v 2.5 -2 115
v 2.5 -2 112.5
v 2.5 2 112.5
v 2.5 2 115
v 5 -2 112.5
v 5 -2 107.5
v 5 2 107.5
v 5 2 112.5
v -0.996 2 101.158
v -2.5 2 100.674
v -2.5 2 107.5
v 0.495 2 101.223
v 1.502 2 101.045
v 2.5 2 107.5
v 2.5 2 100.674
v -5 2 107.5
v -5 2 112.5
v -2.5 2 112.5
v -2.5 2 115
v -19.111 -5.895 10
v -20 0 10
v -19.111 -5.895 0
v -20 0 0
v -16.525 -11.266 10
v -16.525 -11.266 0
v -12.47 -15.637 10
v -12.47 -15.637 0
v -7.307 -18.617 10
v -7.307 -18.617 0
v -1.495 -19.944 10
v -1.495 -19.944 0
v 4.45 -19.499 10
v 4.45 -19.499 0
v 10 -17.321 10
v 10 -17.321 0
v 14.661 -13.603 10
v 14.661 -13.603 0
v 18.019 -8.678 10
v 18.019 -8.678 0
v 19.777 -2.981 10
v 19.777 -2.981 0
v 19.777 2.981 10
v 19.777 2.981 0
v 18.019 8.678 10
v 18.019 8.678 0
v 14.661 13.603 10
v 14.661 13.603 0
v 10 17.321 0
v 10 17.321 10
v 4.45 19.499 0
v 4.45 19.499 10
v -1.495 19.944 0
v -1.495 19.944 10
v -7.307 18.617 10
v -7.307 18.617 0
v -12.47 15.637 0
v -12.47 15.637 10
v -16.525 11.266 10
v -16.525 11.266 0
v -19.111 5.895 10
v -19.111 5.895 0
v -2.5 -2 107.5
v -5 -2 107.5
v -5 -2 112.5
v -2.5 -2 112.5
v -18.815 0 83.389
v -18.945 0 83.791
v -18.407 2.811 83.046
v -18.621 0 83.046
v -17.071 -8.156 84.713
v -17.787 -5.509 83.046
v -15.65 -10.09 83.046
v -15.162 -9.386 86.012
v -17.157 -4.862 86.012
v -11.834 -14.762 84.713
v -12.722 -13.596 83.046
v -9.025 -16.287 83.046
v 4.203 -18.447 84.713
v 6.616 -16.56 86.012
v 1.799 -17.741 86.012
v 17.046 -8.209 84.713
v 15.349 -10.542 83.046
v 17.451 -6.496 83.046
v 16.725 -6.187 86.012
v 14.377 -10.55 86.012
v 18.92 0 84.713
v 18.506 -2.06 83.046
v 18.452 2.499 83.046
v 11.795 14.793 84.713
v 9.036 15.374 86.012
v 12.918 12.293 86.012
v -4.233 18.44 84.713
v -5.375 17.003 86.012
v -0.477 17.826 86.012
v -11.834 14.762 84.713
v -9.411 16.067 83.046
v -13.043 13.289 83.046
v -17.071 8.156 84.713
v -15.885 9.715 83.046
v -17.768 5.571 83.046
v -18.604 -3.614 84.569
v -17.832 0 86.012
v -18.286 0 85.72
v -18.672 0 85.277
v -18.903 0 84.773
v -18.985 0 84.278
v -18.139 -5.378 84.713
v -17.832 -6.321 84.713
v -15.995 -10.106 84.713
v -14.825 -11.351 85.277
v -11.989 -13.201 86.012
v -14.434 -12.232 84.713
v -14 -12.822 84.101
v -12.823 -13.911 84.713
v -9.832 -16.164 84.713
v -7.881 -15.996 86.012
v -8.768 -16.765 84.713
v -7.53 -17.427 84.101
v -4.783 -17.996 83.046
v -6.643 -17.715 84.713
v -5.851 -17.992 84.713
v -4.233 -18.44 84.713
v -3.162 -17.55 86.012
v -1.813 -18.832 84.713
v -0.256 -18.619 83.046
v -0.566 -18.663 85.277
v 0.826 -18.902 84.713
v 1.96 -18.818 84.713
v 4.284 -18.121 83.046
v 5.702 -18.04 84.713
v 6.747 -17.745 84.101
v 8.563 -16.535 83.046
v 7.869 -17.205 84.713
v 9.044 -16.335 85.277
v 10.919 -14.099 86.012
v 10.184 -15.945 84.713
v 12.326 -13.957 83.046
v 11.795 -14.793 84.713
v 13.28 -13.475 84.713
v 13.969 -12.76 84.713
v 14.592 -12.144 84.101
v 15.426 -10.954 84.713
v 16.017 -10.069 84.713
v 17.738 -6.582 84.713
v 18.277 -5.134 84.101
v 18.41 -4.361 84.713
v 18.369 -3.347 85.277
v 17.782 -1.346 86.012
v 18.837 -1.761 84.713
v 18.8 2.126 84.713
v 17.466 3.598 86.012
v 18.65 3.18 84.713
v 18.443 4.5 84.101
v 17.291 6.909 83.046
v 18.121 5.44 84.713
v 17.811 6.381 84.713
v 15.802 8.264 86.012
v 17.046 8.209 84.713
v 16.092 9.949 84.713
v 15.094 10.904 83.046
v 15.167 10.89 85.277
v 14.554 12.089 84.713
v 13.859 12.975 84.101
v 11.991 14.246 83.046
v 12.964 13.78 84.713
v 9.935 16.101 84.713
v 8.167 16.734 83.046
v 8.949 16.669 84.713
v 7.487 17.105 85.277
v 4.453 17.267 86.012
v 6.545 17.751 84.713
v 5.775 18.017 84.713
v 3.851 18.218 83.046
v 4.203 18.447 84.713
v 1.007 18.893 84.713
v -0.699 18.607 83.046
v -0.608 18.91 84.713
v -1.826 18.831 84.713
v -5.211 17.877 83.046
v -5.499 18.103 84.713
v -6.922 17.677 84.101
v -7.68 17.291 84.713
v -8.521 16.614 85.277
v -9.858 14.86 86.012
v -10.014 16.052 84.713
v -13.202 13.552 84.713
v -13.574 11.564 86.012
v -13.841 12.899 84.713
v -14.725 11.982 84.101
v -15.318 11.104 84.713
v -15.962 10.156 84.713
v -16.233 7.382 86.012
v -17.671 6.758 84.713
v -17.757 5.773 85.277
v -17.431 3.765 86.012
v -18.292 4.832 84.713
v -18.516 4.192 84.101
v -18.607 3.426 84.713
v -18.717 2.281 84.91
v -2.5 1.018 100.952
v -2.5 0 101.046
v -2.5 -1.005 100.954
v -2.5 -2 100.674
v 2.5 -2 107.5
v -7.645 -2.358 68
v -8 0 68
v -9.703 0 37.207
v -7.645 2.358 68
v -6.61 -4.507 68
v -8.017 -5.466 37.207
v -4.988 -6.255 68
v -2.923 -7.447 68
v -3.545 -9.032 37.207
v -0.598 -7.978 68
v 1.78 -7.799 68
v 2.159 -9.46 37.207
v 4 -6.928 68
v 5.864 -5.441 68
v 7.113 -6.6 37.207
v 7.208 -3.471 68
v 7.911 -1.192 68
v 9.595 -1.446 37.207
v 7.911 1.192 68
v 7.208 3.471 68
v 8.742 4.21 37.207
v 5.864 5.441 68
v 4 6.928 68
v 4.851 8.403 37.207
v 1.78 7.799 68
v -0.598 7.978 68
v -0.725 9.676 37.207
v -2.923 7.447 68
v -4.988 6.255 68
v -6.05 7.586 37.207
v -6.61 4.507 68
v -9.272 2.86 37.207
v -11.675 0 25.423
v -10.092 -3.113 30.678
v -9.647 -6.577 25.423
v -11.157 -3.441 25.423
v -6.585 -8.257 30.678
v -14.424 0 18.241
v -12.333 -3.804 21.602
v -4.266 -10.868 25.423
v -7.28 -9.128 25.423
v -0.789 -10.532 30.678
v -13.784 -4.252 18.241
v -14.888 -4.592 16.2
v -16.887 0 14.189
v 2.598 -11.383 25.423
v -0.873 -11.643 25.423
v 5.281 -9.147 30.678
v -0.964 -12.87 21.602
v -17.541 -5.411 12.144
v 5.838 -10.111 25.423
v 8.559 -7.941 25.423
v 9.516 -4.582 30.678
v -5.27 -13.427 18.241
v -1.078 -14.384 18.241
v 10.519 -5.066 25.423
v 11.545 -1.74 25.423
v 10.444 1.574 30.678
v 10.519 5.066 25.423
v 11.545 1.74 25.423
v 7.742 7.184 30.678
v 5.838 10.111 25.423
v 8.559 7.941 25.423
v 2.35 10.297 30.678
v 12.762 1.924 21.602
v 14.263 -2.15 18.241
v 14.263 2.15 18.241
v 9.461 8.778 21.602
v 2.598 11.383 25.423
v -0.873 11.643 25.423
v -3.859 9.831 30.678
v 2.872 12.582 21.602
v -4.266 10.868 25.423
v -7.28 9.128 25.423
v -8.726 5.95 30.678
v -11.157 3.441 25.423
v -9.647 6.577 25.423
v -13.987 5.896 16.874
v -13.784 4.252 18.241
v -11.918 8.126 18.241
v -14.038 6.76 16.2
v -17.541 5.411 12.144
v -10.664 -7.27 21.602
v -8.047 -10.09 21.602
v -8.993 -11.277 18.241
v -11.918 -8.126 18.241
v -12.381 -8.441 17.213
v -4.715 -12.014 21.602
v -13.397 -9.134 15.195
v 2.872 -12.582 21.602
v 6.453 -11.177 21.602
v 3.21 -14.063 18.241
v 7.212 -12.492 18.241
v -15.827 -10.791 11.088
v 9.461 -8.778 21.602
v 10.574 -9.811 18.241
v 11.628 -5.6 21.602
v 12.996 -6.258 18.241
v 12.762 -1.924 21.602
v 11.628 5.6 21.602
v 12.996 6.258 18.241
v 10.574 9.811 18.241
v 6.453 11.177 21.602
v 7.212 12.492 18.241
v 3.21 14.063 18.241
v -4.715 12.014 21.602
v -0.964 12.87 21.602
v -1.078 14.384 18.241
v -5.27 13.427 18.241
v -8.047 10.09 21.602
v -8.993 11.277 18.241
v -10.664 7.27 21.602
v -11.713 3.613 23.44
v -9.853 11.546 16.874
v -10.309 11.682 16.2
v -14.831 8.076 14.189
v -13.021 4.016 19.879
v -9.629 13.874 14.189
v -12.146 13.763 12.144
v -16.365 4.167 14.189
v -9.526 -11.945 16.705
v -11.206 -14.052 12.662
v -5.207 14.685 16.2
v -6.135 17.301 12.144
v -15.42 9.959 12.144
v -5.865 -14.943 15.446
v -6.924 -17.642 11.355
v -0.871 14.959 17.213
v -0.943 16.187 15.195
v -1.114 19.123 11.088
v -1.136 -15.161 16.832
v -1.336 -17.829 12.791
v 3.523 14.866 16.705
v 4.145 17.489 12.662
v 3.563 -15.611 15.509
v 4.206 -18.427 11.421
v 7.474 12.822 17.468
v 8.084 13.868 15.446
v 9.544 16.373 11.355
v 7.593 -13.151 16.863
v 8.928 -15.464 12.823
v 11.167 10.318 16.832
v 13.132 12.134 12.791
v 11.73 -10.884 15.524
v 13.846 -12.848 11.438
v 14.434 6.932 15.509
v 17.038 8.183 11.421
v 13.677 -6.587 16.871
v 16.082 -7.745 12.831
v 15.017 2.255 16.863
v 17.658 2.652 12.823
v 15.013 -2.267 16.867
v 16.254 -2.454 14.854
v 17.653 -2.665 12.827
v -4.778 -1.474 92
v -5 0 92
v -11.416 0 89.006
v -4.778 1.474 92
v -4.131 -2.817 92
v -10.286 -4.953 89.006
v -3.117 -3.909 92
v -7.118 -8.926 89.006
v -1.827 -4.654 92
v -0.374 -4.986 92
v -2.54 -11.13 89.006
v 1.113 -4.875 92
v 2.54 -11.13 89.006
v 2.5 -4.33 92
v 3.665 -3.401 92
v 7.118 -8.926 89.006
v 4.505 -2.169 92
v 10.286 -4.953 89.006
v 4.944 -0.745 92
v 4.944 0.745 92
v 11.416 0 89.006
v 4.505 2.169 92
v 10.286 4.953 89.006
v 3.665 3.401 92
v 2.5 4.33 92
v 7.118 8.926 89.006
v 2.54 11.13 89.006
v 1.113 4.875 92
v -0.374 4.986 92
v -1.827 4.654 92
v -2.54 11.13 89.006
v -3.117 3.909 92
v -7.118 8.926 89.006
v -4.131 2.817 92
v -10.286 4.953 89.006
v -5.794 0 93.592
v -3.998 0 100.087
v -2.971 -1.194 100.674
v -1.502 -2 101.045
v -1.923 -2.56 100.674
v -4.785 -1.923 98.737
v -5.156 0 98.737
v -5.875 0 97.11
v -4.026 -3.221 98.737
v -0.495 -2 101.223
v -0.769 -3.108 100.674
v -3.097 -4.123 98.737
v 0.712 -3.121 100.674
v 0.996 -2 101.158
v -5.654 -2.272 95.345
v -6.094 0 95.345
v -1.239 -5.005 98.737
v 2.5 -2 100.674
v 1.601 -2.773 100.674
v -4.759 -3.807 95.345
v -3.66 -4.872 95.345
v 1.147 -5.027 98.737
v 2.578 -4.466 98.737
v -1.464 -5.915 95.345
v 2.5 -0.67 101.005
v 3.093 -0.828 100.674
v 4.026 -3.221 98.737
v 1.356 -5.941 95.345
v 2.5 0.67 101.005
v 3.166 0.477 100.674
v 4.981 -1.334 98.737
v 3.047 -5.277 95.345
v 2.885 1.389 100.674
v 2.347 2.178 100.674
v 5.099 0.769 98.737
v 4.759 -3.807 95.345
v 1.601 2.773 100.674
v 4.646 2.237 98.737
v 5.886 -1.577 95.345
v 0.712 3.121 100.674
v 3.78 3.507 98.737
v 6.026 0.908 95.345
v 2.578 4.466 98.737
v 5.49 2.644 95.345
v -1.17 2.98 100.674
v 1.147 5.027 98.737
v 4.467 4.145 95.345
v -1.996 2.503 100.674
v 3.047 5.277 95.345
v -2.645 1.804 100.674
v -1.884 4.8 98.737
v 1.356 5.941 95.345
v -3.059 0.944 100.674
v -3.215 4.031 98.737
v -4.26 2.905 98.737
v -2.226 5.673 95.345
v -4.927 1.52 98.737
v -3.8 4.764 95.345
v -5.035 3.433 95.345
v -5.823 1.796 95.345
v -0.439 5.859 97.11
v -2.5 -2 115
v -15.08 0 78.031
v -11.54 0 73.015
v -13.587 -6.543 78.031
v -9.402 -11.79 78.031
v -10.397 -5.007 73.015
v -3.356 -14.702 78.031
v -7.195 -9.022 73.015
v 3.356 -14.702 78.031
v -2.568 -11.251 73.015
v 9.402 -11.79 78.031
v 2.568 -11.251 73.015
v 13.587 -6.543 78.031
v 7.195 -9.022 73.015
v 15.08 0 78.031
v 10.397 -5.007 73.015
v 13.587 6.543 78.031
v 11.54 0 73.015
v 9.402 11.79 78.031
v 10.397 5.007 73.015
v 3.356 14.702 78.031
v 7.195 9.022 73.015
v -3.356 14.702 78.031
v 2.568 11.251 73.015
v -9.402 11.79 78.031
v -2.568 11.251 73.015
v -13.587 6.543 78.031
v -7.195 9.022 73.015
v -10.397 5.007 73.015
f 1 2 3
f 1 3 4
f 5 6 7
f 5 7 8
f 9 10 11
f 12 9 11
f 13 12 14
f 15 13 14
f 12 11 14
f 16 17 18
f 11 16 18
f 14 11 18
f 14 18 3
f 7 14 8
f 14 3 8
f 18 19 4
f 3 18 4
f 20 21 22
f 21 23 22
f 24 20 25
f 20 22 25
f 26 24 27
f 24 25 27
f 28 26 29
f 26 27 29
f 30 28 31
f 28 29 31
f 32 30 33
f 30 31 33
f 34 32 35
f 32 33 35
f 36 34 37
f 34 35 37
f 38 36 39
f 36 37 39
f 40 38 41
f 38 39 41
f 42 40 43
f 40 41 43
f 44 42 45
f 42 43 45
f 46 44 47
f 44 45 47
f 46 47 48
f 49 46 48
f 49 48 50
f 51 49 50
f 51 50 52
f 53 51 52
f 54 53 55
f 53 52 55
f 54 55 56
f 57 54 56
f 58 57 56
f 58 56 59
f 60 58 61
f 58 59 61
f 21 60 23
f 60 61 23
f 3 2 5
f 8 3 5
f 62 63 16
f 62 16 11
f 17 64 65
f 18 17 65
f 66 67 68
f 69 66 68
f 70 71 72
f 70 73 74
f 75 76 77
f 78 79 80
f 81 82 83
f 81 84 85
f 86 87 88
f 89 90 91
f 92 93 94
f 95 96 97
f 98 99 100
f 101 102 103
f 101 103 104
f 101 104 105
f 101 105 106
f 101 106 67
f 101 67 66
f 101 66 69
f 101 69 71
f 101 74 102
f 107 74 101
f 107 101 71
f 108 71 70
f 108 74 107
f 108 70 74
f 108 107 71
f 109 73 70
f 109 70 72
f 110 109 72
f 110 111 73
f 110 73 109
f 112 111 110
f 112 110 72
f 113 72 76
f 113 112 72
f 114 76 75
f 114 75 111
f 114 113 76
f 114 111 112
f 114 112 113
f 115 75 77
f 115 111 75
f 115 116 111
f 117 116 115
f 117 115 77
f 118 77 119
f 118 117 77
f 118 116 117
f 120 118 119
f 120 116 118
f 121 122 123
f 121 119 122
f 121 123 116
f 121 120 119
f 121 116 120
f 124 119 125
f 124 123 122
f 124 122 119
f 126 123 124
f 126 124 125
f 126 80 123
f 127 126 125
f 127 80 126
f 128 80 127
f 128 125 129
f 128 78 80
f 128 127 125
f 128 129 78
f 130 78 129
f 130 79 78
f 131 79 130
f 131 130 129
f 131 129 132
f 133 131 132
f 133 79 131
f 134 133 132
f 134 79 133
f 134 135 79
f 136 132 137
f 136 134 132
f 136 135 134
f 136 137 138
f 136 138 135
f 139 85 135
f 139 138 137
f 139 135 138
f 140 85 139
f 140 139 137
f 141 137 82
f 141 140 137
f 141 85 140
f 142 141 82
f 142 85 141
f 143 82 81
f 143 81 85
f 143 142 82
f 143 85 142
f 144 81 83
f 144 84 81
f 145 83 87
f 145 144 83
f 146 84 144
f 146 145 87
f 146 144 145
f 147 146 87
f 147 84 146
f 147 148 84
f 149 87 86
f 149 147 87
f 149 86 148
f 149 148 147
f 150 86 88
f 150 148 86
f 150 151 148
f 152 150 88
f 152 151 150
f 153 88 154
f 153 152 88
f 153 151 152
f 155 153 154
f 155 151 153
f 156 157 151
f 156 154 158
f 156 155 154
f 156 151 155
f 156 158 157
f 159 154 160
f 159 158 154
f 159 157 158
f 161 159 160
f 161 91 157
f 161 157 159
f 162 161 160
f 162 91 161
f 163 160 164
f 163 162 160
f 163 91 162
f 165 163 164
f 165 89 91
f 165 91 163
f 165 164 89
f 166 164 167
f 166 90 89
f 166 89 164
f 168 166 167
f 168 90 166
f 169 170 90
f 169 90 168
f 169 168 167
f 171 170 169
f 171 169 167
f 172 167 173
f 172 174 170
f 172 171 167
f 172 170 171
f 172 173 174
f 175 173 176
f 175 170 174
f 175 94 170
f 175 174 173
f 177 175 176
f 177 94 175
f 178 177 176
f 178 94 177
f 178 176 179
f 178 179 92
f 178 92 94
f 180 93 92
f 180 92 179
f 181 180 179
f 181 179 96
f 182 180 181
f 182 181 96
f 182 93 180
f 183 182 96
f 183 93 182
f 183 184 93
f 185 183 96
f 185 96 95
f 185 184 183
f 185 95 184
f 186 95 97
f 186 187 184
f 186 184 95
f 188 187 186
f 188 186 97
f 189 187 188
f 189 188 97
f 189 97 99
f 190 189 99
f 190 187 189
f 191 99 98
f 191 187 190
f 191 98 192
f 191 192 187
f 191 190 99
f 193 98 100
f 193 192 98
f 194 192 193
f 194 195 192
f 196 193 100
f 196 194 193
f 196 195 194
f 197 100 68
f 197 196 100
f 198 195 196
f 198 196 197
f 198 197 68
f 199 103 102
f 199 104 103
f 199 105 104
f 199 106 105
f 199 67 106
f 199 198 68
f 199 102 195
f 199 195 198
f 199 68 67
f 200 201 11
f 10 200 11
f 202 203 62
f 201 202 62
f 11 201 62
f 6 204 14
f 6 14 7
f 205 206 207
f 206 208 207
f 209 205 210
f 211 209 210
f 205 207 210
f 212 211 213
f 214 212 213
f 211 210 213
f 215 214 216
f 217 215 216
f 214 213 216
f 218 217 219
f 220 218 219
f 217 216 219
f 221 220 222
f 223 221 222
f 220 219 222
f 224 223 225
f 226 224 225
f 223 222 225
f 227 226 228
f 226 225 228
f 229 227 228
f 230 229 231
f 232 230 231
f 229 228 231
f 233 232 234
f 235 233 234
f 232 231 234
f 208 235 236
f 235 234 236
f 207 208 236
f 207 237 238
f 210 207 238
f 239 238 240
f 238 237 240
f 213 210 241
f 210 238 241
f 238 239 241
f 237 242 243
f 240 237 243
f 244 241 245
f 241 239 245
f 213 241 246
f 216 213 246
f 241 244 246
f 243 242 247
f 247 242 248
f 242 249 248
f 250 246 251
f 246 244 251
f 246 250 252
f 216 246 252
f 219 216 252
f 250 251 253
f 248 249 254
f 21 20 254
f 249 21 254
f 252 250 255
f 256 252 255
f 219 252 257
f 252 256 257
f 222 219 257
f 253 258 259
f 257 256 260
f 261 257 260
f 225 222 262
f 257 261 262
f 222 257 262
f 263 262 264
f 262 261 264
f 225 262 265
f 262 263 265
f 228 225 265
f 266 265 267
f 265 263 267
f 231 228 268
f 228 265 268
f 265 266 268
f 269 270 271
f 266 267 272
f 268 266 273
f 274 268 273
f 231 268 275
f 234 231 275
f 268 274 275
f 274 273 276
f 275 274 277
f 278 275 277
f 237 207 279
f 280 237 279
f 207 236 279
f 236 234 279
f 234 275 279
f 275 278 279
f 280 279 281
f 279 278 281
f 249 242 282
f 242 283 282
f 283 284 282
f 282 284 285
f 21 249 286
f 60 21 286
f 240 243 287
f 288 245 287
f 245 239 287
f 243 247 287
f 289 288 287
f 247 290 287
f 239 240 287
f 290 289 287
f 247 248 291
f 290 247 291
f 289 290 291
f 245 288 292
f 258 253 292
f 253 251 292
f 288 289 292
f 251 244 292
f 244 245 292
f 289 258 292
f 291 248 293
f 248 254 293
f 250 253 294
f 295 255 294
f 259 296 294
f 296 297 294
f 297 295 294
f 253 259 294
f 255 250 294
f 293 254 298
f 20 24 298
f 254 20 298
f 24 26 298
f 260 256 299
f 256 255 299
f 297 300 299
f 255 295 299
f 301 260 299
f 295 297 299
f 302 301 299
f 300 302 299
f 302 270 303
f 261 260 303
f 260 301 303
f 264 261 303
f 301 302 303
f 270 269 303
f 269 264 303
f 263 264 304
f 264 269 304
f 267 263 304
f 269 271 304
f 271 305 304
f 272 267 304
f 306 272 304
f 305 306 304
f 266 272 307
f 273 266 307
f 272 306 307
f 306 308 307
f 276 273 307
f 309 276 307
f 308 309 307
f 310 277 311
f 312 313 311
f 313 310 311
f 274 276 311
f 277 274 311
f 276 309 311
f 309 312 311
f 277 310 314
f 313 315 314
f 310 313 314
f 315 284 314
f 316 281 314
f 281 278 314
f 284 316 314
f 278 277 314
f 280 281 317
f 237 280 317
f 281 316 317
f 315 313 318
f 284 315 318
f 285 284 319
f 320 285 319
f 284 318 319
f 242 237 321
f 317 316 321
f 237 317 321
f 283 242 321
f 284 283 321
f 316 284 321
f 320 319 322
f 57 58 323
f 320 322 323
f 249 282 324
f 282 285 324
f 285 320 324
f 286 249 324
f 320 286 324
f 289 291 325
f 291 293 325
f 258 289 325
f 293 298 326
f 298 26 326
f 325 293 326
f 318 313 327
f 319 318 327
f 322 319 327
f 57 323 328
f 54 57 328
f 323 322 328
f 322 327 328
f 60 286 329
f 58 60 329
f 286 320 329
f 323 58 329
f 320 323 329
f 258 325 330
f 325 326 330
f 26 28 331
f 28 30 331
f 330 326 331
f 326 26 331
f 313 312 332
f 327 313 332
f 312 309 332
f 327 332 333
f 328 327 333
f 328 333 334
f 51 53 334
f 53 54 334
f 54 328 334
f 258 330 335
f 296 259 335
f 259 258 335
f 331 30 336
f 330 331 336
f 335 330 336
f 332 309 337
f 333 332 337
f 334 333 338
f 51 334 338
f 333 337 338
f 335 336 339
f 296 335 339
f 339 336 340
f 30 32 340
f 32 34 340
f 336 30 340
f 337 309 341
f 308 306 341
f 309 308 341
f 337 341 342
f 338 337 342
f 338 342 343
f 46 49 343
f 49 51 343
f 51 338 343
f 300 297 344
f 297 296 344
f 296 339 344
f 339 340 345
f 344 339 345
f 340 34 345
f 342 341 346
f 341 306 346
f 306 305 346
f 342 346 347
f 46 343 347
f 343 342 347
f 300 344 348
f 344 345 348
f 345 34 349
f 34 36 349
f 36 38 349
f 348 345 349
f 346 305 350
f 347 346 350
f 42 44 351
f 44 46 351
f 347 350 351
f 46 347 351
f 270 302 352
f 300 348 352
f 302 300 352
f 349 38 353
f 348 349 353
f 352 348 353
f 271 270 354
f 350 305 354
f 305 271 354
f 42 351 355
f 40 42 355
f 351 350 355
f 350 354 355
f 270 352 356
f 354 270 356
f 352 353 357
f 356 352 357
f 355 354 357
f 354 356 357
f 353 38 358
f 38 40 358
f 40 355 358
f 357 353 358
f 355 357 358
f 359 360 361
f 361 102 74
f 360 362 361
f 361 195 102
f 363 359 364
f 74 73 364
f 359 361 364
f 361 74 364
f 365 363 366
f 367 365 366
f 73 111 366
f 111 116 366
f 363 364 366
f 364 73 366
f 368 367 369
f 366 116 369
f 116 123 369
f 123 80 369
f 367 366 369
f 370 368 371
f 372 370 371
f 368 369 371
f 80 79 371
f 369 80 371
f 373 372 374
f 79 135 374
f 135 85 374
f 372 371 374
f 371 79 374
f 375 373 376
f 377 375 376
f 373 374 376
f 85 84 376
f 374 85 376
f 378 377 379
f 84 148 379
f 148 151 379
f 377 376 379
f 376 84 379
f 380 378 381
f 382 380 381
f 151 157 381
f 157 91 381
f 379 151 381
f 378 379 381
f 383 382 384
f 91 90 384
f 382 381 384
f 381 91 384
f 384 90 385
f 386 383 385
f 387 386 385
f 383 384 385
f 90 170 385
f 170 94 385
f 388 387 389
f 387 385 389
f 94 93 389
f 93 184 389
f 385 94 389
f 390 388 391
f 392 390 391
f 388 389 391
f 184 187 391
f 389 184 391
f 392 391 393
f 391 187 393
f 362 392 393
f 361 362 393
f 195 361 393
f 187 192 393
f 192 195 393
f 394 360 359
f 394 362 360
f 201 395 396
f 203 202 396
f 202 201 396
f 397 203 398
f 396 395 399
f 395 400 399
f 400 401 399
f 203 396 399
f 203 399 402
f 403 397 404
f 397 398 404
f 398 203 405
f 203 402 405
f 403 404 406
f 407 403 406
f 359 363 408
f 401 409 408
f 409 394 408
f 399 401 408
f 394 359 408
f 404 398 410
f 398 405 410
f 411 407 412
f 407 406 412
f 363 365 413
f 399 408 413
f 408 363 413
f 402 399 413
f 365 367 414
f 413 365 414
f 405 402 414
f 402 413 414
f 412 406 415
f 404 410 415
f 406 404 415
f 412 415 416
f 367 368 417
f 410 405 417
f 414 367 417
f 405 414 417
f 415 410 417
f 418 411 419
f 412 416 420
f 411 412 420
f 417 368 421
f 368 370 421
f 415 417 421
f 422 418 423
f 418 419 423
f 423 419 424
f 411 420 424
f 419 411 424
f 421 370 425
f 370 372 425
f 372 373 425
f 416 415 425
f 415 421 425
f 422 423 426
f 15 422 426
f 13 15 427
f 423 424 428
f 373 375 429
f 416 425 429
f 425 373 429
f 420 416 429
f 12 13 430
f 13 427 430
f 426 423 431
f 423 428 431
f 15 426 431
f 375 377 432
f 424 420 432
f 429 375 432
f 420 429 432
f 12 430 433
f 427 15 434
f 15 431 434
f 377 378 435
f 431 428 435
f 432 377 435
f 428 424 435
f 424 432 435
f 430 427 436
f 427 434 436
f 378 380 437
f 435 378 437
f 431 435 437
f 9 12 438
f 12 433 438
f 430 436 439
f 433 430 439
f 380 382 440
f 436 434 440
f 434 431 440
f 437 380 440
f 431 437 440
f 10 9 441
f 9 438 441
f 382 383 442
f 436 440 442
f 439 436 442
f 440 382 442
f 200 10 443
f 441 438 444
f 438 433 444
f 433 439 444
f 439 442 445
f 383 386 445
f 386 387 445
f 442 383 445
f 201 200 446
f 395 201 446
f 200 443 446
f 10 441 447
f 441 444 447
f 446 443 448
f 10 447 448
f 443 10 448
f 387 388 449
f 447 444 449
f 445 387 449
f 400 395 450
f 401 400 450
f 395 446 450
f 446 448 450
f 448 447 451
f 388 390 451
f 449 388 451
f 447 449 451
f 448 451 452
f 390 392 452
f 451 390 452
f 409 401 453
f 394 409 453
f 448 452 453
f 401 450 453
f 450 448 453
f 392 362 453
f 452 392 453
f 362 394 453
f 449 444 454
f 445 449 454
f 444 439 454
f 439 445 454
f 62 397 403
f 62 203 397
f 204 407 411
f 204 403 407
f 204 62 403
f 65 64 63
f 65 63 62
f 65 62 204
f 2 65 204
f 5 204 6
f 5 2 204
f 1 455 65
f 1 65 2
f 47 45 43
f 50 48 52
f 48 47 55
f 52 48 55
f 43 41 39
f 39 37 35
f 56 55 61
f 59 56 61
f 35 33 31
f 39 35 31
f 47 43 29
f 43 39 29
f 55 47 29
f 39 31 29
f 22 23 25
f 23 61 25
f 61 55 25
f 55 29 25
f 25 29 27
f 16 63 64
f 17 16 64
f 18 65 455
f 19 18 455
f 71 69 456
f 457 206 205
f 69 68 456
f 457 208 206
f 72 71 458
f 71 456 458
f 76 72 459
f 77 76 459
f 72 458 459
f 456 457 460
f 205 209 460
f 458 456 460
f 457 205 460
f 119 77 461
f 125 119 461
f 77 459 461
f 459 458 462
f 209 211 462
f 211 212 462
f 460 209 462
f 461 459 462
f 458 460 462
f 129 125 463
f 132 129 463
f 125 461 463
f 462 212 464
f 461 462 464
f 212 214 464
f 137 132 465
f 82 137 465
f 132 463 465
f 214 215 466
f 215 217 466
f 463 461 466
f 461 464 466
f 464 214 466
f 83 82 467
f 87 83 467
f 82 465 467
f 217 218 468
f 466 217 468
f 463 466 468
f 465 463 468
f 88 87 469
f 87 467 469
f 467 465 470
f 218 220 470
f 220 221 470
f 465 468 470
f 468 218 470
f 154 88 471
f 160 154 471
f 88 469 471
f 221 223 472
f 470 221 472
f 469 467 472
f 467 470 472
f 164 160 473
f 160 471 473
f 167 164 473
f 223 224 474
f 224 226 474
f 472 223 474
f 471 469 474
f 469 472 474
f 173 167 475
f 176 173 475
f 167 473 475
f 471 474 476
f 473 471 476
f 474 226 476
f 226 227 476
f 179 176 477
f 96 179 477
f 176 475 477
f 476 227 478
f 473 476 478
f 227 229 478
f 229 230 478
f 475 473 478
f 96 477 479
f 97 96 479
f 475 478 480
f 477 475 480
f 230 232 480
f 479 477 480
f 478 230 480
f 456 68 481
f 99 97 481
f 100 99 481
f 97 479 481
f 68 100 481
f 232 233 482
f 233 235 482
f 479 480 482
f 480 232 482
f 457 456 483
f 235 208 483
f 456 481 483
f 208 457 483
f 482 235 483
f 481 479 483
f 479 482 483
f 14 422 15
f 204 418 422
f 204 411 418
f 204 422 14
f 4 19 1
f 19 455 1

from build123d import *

# Parameters (mm, degrees)
F0_W          = 5
F0_H          = 15
F1_DEPTH      = 2
F1_DEPTH_BACK = 2
F2_W          = 10
F2_H          = 5
F3_DEPTH      = 4
F6_R          = 2


with BuildPart() as f1:
    # F0 (on Front) → F1 (new body, two sides)
    with BuildSketch(Plane.XZ) as f1_sk:
        with Locations((0, 107.5)):
            Rectangle(F0_W, F0_H)
    extrude(amount=F1_DEPTH)
    extrude(f1_sk.sketch, amount=-F1_DEPTH_BACK)

    # F2 (on face) → F3 (join)
    with BuildSketch(Plane.XZ.offset(2)):
        with Locations((0, 110)):
            Rectangle(F2_W, F2_H)
    extrude(amount=-F3_DEPTH)

    # F4 (on Front) → F5 (revolve)
    with BuildSketch(Plane.XZ):
        with BuildLine():
            ThreePointArc((0, 101.582115), (-5.404094, 98.30643), (-5, 92))
            Line((-5, 92), (-20, 85))
            Line((-20, 85), (-8, 68))
            add(Edge.make_bspline(
                [(-8, 68), (-9.443204, 26.660192), (-10.776733, 21.775554), (-20, 10)],
                knots=[0, 0, 0, 0, 59.228372, 59.228372, 59.228372, 59.228372], degree=3))
            Line((-20, 10), (-20, 0))
            Line((-20, 0), (0, 0))
            Line((0, 0), (0, 101.582115))
        make_face()
    revolve(axis=Axis((0, 0, 50.791058), (0, 0, 1)))

    # F6
    f6_edges = [f1.edges().sort_by_distance(p)[0] for p in [
        (20, 0, 85),
    ]]
    fillet(f6_edges, radius=F6_R)


solid = f1.part
